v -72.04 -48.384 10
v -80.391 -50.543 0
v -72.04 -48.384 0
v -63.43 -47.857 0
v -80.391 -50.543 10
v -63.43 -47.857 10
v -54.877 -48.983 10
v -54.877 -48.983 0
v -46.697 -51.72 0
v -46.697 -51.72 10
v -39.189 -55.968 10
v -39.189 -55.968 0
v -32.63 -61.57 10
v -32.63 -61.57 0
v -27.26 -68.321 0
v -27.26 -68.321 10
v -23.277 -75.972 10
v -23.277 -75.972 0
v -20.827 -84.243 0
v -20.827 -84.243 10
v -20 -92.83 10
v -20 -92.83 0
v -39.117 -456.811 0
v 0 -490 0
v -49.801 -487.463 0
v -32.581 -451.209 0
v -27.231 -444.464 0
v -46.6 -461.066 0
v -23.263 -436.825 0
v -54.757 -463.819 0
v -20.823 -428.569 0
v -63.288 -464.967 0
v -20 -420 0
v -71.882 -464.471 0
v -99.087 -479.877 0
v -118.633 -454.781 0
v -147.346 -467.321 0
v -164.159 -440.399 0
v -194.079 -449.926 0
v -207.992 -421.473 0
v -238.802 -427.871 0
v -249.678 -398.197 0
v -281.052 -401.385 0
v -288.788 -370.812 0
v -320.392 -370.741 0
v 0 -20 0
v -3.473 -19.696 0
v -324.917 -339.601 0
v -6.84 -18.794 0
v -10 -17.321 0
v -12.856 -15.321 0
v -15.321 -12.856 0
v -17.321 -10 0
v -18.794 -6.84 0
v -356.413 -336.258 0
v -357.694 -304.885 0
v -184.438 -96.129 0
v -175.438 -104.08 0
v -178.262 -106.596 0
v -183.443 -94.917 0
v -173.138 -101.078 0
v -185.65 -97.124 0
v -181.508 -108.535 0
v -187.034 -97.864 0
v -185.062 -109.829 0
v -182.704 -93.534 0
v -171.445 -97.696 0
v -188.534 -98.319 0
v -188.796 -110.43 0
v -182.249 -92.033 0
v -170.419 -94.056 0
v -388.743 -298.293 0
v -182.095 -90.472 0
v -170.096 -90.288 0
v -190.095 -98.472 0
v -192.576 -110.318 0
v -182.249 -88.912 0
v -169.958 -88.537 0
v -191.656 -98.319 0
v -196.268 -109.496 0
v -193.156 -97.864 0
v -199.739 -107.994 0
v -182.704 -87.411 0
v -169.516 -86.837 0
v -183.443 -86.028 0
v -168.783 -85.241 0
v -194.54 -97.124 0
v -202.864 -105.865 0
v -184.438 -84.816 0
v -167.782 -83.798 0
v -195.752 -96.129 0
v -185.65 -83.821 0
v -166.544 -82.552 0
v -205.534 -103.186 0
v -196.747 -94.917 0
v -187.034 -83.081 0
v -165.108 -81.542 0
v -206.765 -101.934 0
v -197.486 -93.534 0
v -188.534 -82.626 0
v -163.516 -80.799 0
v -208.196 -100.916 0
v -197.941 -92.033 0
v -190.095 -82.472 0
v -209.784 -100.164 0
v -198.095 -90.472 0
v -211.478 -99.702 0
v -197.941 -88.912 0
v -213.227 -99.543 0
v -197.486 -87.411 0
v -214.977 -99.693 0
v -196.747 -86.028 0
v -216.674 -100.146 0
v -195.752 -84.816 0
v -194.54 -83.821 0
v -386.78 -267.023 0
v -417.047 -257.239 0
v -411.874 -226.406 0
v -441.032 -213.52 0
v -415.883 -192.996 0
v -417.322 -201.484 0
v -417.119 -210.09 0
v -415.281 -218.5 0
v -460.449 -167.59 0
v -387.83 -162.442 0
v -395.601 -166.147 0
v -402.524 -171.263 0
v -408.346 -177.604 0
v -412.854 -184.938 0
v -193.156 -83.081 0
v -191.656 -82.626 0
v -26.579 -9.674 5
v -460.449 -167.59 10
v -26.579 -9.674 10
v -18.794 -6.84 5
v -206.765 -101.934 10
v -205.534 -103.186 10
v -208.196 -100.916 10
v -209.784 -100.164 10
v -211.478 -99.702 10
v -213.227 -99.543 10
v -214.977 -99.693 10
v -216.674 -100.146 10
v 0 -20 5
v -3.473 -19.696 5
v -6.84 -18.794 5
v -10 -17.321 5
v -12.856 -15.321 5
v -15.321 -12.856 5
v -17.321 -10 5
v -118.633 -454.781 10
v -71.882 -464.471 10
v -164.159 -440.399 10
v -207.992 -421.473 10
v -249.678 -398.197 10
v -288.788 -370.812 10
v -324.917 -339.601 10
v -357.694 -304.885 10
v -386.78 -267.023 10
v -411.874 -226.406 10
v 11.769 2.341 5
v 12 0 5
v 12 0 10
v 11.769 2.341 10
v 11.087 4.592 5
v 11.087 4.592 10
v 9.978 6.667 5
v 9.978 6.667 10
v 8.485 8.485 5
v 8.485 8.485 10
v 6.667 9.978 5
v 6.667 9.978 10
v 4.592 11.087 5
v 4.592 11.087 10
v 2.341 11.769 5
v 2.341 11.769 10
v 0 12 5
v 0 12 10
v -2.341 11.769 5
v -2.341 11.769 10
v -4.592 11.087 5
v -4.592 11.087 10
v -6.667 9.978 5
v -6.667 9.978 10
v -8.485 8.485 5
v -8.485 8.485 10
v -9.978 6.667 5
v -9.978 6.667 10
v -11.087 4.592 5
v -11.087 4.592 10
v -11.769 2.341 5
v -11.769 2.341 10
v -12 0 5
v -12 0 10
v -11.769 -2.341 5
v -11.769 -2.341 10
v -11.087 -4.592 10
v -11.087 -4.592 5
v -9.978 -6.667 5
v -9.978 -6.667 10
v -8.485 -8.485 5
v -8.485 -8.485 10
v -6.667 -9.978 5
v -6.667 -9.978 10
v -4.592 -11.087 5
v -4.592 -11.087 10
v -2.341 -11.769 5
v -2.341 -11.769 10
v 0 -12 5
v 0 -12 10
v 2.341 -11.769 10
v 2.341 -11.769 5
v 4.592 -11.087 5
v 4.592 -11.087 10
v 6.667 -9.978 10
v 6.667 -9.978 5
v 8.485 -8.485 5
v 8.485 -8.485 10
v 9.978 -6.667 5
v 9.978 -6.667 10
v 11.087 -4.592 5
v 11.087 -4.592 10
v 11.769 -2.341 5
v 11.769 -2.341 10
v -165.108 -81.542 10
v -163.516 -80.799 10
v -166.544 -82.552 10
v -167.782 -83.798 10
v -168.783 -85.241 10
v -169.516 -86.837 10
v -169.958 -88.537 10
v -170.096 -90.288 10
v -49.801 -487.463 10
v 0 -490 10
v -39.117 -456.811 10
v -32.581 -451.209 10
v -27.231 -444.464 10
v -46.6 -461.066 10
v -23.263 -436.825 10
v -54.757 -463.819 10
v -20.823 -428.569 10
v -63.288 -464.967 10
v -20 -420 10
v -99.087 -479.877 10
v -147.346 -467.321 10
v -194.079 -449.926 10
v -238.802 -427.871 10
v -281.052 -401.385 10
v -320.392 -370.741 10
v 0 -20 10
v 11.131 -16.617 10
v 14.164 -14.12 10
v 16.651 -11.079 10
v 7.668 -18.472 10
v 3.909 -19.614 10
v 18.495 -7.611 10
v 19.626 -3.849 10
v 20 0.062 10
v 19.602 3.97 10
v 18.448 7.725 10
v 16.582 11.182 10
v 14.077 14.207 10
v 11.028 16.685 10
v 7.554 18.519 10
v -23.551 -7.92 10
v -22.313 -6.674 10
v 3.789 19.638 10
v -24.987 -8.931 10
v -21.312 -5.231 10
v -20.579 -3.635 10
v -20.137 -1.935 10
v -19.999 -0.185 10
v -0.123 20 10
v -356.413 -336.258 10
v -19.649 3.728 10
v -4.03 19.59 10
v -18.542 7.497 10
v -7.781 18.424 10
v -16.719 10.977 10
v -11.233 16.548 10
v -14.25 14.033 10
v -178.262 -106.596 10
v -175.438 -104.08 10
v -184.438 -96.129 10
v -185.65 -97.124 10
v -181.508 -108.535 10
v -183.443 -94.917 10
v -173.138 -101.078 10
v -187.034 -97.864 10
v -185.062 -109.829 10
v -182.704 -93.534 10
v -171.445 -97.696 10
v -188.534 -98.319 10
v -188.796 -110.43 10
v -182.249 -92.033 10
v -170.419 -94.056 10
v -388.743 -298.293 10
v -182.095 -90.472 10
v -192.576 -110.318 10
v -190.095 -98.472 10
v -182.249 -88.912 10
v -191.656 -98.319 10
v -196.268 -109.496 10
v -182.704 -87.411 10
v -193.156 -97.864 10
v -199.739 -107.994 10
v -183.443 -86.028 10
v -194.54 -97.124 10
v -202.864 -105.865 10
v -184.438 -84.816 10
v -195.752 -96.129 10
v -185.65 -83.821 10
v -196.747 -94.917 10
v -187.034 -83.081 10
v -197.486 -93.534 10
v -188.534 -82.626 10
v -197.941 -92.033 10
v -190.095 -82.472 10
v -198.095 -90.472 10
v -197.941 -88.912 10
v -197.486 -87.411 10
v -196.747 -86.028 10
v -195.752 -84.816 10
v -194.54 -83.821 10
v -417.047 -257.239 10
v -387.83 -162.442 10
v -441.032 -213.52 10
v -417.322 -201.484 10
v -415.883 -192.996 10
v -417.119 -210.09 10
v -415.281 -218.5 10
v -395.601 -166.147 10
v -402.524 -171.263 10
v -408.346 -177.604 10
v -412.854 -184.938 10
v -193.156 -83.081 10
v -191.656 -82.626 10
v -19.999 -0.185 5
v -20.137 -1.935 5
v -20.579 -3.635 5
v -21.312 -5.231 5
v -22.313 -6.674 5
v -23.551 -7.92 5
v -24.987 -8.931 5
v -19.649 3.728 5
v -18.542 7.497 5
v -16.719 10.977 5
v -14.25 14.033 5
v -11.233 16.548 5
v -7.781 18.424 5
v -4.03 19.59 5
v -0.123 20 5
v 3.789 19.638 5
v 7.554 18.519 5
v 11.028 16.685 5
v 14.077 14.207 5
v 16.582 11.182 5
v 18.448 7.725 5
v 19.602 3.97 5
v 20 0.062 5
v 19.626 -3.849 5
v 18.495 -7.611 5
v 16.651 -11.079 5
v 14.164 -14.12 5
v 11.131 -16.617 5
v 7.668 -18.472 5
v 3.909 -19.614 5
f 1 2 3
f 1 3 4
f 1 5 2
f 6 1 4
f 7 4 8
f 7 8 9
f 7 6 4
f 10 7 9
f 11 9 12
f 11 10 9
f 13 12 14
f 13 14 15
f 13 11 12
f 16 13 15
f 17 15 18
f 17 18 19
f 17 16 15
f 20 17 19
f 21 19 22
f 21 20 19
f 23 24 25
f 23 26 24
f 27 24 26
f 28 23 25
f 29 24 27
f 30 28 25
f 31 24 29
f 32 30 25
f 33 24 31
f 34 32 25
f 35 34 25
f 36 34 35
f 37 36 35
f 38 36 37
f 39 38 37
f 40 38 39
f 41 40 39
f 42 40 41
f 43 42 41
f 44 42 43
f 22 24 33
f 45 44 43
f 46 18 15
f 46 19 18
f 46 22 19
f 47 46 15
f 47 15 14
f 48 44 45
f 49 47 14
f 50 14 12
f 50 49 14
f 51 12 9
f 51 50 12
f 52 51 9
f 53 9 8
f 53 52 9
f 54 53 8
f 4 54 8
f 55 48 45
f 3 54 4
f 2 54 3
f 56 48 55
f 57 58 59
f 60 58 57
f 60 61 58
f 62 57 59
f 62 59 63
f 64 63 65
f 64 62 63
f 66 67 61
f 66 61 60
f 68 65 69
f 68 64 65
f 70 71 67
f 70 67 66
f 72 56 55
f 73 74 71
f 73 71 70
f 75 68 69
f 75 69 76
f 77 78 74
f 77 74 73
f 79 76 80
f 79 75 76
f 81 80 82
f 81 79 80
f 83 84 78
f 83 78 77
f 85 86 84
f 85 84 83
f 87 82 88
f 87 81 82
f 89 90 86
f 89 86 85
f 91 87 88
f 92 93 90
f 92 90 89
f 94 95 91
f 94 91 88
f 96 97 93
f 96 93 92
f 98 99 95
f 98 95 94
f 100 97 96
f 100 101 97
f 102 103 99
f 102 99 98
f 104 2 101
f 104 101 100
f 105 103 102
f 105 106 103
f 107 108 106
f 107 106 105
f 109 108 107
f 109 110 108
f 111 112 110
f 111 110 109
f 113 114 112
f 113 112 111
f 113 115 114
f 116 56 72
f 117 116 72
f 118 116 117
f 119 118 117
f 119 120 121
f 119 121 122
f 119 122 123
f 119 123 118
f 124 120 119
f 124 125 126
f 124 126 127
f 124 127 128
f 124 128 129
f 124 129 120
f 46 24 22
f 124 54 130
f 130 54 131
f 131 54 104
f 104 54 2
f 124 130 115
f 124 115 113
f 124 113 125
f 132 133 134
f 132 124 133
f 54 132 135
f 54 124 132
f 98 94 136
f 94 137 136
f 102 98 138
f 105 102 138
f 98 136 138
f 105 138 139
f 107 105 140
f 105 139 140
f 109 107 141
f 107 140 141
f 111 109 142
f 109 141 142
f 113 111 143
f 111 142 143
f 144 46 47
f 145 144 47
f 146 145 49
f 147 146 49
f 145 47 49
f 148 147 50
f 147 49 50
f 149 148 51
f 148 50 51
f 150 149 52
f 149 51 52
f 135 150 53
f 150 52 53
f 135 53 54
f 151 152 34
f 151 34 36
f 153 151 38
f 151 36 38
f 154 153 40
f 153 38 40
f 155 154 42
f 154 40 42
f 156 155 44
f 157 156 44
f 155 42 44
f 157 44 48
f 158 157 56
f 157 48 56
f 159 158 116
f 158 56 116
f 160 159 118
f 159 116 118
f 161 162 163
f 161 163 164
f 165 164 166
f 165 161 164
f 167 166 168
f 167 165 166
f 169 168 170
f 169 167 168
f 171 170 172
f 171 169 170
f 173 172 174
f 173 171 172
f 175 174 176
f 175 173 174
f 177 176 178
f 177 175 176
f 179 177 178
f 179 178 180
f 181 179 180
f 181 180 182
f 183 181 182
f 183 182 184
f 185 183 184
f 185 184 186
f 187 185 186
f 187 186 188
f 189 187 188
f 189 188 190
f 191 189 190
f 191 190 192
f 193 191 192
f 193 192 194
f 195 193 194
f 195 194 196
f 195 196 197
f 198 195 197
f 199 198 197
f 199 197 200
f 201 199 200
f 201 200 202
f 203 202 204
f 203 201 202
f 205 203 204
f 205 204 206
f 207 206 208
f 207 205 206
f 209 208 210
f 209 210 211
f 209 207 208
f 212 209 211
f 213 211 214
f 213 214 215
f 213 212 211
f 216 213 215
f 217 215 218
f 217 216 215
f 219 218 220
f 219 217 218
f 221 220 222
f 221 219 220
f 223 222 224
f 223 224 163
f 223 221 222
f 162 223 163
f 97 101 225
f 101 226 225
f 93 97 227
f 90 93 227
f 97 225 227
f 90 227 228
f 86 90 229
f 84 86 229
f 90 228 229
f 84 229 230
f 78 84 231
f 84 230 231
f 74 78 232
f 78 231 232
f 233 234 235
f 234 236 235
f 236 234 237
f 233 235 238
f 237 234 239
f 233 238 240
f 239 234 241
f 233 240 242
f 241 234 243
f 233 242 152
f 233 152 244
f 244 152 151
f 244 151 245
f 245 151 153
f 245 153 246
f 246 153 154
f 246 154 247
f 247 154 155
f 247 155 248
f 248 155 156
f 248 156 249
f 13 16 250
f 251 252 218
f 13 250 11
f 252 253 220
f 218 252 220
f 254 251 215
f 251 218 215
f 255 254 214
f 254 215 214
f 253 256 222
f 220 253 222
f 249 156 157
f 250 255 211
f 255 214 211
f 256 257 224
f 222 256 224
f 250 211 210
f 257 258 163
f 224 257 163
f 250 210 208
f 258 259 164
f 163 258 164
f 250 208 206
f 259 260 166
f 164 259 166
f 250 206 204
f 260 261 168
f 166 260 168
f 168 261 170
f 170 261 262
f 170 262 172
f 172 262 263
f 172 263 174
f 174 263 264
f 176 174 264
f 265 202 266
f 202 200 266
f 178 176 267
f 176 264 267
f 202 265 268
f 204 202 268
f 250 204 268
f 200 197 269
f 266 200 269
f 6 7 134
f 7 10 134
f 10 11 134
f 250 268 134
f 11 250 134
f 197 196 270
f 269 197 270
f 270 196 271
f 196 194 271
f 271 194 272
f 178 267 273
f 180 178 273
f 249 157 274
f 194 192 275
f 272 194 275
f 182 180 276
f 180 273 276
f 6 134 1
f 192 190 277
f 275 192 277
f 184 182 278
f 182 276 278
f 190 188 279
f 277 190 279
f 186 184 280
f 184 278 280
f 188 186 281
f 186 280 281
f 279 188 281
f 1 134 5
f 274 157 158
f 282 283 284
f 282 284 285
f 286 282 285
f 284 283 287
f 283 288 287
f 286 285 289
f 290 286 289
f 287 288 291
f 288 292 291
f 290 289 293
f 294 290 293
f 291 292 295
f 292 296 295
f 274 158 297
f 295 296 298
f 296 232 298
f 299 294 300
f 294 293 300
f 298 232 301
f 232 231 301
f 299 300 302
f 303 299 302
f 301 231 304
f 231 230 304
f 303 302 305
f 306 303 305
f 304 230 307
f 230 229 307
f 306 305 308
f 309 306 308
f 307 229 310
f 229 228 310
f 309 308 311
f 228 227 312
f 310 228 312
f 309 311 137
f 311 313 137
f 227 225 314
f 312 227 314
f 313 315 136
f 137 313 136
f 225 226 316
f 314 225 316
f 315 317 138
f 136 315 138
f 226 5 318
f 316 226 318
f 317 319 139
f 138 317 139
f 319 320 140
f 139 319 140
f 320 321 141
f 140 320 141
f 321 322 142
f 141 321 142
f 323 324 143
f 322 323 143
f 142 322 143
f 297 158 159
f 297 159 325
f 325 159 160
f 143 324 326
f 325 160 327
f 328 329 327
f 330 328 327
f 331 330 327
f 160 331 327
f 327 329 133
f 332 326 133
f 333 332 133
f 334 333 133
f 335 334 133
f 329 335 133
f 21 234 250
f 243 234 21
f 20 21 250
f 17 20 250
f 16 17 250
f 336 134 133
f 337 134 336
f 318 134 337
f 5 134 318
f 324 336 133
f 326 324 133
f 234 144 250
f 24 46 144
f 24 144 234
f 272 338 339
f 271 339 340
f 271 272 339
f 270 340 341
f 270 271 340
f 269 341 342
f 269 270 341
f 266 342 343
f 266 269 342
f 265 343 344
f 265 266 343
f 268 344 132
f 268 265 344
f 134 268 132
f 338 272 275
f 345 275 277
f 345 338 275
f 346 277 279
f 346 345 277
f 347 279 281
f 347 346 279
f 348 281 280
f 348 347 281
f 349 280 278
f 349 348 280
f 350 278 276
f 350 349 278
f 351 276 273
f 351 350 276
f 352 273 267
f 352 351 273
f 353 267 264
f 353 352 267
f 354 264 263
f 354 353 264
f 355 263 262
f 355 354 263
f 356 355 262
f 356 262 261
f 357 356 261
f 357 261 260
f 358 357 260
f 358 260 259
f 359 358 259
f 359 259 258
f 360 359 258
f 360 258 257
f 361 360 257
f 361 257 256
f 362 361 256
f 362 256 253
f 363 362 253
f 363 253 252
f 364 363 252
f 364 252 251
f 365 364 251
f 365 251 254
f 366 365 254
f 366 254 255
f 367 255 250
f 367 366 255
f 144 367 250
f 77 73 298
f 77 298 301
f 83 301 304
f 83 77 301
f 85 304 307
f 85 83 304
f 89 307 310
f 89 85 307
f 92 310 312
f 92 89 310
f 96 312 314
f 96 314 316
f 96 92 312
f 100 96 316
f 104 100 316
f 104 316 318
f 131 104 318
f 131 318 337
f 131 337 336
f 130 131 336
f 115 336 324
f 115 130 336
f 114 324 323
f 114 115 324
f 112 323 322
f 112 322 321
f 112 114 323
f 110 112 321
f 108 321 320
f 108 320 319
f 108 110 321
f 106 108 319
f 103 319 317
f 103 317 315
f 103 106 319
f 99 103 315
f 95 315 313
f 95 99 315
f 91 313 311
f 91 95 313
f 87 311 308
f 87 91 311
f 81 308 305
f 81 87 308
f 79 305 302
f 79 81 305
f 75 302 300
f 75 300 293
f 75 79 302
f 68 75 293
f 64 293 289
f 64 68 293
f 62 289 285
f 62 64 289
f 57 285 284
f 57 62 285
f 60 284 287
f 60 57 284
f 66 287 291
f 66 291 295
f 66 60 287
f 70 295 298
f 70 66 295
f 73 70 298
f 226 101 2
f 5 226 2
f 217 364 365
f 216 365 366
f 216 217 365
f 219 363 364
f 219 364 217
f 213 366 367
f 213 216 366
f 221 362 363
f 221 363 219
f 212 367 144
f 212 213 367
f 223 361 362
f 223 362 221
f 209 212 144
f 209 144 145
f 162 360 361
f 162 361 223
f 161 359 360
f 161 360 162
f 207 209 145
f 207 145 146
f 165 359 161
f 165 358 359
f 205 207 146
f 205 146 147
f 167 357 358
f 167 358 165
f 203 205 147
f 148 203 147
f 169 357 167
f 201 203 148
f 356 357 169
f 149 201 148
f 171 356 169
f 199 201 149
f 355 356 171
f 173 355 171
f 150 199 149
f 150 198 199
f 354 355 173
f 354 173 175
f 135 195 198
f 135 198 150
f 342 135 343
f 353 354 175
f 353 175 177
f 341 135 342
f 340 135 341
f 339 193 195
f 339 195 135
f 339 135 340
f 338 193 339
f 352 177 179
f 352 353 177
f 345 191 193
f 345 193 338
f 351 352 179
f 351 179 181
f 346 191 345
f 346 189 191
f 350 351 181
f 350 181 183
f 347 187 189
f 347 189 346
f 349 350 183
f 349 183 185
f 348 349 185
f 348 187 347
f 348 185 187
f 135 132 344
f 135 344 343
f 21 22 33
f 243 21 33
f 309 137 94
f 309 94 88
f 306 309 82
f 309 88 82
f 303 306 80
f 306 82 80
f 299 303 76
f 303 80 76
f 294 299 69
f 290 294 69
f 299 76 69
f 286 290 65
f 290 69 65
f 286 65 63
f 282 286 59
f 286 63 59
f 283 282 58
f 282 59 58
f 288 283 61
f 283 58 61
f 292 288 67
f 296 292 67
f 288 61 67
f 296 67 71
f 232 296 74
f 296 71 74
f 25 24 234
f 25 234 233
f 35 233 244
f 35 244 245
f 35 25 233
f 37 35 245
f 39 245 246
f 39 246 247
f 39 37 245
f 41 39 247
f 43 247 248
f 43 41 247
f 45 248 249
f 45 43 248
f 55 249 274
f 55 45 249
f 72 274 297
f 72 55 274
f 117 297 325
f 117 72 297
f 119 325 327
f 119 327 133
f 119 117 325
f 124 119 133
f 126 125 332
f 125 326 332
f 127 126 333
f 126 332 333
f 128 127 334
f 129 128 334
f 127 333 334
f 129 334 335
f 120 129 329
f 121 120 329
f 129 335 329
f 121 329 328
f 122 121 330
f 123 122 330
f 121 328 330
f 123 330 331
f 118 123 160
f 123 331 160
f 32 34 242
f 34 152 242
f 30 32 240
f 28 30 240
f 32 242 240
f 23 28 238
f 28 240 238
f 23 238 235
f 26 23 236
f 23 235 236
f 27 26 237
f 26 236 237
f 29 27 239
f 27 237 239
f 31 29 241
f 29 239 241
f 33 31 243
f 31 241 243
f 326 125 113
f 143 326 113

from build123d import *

# Parameters (mm, degrees)
SZKIC1_R                    = 12
SZKIC1_R_2                  = 8
DODANIE_WYCI_GNI_CIE1_DEPTH = 10
SZKIC2_R                    = 20
WYTNIJ_WYCI_GNI_CIE1_DEPTH  = 5
ZAOKR_GLENIE1_R             = 45
ZAOKR_GLENIE2_R             = 10


with BuildPart() as part:
    # Szkic1 → Dodanie-wyciągnięcie1 (new body)
    with BuildSketch(Plane.XY):
        with BuildLine():
            Line((0, -20), (0, -490))
            ThreePointArc((0, -490), (-281.052453812, -401.384501702), (-460.449384185, -167.58987023))
            Line((-460.449384185, -167.58987023), (-18.793852416, -6.840402867))
            ThreePointArc((-18.793852416, -6.840402867), (11.471528727, 16.383040886), (0, -20))
        make_face()
        Circle(SZKIC1_R, mode=Mode.SUBTRACT)
        with Locations((-190.094997116, -90.472476083)):
            Circle(SZKIC1_R_2, mode=Mode.SUBTRACT)
        with BuildLine():
            Line((-20, -28.562960135), (-20, -469.574275275))
            ThreePointArc((-20, -469.574275275), (-269.580925085, -385.001460816), (-434.41507852, -179.397713347))
            Line((-434.41507852, -179.397713347), (-208.888849532, -97.312878949))
            ThreePointArc((-208.888849532, -97.312878949), (-183.254594249, -109.266328498), (-171.3011447, -83.632073216))
            Line((-171.3011447, -83.632073216), (-20, -28.562960135))
        make_face(mode=Mode.SUBTRACT)
    extrude(amount=DODANIE_WYCI_GNI_CIE1_DEPTH)

    # Szkic2 → Wytnij-wyciągnięcie1 (cut)
    with BuildSketch(Plane(origin=(0, 0, 0), x_dir=(-1, 0, 0), z_dir=(0, 0, -1))):
        Circle(SZKIC2_R)
    extrude(amount=-WYTNIJ_WYCI_GNI_CIE1_DEPTH, mode=Mode.SUBTRACT)

    # Zaokrąglenie1
    zaokr_glenie1_edges = [part.edges().sort_by_distance(p)[0] for p in [
        (-434.41507852, -179.397713347, 5),
        (-20, -469.574275275, 5),
        (-20, -28.562960135, 5),
    ]]
    fillet(zaokr_glenie1_edges, radius=ZAOKR_GLENIE1_R)

    # Zaokrąglenie2
    zaokr_glenie2_edges = [part.edges().sort_by_distance(p)[0] for p in [
        (-171.3011447, -83.632073216, 5),
        (-208.888849532, -97.312878949, 5),
        (-18.793852416, -6.840402867, 7.5),
    ]]
    fillet(zaokr_glenie2_edges, radius=ZAOKR_GLENIE2_R)


solid = part.part
